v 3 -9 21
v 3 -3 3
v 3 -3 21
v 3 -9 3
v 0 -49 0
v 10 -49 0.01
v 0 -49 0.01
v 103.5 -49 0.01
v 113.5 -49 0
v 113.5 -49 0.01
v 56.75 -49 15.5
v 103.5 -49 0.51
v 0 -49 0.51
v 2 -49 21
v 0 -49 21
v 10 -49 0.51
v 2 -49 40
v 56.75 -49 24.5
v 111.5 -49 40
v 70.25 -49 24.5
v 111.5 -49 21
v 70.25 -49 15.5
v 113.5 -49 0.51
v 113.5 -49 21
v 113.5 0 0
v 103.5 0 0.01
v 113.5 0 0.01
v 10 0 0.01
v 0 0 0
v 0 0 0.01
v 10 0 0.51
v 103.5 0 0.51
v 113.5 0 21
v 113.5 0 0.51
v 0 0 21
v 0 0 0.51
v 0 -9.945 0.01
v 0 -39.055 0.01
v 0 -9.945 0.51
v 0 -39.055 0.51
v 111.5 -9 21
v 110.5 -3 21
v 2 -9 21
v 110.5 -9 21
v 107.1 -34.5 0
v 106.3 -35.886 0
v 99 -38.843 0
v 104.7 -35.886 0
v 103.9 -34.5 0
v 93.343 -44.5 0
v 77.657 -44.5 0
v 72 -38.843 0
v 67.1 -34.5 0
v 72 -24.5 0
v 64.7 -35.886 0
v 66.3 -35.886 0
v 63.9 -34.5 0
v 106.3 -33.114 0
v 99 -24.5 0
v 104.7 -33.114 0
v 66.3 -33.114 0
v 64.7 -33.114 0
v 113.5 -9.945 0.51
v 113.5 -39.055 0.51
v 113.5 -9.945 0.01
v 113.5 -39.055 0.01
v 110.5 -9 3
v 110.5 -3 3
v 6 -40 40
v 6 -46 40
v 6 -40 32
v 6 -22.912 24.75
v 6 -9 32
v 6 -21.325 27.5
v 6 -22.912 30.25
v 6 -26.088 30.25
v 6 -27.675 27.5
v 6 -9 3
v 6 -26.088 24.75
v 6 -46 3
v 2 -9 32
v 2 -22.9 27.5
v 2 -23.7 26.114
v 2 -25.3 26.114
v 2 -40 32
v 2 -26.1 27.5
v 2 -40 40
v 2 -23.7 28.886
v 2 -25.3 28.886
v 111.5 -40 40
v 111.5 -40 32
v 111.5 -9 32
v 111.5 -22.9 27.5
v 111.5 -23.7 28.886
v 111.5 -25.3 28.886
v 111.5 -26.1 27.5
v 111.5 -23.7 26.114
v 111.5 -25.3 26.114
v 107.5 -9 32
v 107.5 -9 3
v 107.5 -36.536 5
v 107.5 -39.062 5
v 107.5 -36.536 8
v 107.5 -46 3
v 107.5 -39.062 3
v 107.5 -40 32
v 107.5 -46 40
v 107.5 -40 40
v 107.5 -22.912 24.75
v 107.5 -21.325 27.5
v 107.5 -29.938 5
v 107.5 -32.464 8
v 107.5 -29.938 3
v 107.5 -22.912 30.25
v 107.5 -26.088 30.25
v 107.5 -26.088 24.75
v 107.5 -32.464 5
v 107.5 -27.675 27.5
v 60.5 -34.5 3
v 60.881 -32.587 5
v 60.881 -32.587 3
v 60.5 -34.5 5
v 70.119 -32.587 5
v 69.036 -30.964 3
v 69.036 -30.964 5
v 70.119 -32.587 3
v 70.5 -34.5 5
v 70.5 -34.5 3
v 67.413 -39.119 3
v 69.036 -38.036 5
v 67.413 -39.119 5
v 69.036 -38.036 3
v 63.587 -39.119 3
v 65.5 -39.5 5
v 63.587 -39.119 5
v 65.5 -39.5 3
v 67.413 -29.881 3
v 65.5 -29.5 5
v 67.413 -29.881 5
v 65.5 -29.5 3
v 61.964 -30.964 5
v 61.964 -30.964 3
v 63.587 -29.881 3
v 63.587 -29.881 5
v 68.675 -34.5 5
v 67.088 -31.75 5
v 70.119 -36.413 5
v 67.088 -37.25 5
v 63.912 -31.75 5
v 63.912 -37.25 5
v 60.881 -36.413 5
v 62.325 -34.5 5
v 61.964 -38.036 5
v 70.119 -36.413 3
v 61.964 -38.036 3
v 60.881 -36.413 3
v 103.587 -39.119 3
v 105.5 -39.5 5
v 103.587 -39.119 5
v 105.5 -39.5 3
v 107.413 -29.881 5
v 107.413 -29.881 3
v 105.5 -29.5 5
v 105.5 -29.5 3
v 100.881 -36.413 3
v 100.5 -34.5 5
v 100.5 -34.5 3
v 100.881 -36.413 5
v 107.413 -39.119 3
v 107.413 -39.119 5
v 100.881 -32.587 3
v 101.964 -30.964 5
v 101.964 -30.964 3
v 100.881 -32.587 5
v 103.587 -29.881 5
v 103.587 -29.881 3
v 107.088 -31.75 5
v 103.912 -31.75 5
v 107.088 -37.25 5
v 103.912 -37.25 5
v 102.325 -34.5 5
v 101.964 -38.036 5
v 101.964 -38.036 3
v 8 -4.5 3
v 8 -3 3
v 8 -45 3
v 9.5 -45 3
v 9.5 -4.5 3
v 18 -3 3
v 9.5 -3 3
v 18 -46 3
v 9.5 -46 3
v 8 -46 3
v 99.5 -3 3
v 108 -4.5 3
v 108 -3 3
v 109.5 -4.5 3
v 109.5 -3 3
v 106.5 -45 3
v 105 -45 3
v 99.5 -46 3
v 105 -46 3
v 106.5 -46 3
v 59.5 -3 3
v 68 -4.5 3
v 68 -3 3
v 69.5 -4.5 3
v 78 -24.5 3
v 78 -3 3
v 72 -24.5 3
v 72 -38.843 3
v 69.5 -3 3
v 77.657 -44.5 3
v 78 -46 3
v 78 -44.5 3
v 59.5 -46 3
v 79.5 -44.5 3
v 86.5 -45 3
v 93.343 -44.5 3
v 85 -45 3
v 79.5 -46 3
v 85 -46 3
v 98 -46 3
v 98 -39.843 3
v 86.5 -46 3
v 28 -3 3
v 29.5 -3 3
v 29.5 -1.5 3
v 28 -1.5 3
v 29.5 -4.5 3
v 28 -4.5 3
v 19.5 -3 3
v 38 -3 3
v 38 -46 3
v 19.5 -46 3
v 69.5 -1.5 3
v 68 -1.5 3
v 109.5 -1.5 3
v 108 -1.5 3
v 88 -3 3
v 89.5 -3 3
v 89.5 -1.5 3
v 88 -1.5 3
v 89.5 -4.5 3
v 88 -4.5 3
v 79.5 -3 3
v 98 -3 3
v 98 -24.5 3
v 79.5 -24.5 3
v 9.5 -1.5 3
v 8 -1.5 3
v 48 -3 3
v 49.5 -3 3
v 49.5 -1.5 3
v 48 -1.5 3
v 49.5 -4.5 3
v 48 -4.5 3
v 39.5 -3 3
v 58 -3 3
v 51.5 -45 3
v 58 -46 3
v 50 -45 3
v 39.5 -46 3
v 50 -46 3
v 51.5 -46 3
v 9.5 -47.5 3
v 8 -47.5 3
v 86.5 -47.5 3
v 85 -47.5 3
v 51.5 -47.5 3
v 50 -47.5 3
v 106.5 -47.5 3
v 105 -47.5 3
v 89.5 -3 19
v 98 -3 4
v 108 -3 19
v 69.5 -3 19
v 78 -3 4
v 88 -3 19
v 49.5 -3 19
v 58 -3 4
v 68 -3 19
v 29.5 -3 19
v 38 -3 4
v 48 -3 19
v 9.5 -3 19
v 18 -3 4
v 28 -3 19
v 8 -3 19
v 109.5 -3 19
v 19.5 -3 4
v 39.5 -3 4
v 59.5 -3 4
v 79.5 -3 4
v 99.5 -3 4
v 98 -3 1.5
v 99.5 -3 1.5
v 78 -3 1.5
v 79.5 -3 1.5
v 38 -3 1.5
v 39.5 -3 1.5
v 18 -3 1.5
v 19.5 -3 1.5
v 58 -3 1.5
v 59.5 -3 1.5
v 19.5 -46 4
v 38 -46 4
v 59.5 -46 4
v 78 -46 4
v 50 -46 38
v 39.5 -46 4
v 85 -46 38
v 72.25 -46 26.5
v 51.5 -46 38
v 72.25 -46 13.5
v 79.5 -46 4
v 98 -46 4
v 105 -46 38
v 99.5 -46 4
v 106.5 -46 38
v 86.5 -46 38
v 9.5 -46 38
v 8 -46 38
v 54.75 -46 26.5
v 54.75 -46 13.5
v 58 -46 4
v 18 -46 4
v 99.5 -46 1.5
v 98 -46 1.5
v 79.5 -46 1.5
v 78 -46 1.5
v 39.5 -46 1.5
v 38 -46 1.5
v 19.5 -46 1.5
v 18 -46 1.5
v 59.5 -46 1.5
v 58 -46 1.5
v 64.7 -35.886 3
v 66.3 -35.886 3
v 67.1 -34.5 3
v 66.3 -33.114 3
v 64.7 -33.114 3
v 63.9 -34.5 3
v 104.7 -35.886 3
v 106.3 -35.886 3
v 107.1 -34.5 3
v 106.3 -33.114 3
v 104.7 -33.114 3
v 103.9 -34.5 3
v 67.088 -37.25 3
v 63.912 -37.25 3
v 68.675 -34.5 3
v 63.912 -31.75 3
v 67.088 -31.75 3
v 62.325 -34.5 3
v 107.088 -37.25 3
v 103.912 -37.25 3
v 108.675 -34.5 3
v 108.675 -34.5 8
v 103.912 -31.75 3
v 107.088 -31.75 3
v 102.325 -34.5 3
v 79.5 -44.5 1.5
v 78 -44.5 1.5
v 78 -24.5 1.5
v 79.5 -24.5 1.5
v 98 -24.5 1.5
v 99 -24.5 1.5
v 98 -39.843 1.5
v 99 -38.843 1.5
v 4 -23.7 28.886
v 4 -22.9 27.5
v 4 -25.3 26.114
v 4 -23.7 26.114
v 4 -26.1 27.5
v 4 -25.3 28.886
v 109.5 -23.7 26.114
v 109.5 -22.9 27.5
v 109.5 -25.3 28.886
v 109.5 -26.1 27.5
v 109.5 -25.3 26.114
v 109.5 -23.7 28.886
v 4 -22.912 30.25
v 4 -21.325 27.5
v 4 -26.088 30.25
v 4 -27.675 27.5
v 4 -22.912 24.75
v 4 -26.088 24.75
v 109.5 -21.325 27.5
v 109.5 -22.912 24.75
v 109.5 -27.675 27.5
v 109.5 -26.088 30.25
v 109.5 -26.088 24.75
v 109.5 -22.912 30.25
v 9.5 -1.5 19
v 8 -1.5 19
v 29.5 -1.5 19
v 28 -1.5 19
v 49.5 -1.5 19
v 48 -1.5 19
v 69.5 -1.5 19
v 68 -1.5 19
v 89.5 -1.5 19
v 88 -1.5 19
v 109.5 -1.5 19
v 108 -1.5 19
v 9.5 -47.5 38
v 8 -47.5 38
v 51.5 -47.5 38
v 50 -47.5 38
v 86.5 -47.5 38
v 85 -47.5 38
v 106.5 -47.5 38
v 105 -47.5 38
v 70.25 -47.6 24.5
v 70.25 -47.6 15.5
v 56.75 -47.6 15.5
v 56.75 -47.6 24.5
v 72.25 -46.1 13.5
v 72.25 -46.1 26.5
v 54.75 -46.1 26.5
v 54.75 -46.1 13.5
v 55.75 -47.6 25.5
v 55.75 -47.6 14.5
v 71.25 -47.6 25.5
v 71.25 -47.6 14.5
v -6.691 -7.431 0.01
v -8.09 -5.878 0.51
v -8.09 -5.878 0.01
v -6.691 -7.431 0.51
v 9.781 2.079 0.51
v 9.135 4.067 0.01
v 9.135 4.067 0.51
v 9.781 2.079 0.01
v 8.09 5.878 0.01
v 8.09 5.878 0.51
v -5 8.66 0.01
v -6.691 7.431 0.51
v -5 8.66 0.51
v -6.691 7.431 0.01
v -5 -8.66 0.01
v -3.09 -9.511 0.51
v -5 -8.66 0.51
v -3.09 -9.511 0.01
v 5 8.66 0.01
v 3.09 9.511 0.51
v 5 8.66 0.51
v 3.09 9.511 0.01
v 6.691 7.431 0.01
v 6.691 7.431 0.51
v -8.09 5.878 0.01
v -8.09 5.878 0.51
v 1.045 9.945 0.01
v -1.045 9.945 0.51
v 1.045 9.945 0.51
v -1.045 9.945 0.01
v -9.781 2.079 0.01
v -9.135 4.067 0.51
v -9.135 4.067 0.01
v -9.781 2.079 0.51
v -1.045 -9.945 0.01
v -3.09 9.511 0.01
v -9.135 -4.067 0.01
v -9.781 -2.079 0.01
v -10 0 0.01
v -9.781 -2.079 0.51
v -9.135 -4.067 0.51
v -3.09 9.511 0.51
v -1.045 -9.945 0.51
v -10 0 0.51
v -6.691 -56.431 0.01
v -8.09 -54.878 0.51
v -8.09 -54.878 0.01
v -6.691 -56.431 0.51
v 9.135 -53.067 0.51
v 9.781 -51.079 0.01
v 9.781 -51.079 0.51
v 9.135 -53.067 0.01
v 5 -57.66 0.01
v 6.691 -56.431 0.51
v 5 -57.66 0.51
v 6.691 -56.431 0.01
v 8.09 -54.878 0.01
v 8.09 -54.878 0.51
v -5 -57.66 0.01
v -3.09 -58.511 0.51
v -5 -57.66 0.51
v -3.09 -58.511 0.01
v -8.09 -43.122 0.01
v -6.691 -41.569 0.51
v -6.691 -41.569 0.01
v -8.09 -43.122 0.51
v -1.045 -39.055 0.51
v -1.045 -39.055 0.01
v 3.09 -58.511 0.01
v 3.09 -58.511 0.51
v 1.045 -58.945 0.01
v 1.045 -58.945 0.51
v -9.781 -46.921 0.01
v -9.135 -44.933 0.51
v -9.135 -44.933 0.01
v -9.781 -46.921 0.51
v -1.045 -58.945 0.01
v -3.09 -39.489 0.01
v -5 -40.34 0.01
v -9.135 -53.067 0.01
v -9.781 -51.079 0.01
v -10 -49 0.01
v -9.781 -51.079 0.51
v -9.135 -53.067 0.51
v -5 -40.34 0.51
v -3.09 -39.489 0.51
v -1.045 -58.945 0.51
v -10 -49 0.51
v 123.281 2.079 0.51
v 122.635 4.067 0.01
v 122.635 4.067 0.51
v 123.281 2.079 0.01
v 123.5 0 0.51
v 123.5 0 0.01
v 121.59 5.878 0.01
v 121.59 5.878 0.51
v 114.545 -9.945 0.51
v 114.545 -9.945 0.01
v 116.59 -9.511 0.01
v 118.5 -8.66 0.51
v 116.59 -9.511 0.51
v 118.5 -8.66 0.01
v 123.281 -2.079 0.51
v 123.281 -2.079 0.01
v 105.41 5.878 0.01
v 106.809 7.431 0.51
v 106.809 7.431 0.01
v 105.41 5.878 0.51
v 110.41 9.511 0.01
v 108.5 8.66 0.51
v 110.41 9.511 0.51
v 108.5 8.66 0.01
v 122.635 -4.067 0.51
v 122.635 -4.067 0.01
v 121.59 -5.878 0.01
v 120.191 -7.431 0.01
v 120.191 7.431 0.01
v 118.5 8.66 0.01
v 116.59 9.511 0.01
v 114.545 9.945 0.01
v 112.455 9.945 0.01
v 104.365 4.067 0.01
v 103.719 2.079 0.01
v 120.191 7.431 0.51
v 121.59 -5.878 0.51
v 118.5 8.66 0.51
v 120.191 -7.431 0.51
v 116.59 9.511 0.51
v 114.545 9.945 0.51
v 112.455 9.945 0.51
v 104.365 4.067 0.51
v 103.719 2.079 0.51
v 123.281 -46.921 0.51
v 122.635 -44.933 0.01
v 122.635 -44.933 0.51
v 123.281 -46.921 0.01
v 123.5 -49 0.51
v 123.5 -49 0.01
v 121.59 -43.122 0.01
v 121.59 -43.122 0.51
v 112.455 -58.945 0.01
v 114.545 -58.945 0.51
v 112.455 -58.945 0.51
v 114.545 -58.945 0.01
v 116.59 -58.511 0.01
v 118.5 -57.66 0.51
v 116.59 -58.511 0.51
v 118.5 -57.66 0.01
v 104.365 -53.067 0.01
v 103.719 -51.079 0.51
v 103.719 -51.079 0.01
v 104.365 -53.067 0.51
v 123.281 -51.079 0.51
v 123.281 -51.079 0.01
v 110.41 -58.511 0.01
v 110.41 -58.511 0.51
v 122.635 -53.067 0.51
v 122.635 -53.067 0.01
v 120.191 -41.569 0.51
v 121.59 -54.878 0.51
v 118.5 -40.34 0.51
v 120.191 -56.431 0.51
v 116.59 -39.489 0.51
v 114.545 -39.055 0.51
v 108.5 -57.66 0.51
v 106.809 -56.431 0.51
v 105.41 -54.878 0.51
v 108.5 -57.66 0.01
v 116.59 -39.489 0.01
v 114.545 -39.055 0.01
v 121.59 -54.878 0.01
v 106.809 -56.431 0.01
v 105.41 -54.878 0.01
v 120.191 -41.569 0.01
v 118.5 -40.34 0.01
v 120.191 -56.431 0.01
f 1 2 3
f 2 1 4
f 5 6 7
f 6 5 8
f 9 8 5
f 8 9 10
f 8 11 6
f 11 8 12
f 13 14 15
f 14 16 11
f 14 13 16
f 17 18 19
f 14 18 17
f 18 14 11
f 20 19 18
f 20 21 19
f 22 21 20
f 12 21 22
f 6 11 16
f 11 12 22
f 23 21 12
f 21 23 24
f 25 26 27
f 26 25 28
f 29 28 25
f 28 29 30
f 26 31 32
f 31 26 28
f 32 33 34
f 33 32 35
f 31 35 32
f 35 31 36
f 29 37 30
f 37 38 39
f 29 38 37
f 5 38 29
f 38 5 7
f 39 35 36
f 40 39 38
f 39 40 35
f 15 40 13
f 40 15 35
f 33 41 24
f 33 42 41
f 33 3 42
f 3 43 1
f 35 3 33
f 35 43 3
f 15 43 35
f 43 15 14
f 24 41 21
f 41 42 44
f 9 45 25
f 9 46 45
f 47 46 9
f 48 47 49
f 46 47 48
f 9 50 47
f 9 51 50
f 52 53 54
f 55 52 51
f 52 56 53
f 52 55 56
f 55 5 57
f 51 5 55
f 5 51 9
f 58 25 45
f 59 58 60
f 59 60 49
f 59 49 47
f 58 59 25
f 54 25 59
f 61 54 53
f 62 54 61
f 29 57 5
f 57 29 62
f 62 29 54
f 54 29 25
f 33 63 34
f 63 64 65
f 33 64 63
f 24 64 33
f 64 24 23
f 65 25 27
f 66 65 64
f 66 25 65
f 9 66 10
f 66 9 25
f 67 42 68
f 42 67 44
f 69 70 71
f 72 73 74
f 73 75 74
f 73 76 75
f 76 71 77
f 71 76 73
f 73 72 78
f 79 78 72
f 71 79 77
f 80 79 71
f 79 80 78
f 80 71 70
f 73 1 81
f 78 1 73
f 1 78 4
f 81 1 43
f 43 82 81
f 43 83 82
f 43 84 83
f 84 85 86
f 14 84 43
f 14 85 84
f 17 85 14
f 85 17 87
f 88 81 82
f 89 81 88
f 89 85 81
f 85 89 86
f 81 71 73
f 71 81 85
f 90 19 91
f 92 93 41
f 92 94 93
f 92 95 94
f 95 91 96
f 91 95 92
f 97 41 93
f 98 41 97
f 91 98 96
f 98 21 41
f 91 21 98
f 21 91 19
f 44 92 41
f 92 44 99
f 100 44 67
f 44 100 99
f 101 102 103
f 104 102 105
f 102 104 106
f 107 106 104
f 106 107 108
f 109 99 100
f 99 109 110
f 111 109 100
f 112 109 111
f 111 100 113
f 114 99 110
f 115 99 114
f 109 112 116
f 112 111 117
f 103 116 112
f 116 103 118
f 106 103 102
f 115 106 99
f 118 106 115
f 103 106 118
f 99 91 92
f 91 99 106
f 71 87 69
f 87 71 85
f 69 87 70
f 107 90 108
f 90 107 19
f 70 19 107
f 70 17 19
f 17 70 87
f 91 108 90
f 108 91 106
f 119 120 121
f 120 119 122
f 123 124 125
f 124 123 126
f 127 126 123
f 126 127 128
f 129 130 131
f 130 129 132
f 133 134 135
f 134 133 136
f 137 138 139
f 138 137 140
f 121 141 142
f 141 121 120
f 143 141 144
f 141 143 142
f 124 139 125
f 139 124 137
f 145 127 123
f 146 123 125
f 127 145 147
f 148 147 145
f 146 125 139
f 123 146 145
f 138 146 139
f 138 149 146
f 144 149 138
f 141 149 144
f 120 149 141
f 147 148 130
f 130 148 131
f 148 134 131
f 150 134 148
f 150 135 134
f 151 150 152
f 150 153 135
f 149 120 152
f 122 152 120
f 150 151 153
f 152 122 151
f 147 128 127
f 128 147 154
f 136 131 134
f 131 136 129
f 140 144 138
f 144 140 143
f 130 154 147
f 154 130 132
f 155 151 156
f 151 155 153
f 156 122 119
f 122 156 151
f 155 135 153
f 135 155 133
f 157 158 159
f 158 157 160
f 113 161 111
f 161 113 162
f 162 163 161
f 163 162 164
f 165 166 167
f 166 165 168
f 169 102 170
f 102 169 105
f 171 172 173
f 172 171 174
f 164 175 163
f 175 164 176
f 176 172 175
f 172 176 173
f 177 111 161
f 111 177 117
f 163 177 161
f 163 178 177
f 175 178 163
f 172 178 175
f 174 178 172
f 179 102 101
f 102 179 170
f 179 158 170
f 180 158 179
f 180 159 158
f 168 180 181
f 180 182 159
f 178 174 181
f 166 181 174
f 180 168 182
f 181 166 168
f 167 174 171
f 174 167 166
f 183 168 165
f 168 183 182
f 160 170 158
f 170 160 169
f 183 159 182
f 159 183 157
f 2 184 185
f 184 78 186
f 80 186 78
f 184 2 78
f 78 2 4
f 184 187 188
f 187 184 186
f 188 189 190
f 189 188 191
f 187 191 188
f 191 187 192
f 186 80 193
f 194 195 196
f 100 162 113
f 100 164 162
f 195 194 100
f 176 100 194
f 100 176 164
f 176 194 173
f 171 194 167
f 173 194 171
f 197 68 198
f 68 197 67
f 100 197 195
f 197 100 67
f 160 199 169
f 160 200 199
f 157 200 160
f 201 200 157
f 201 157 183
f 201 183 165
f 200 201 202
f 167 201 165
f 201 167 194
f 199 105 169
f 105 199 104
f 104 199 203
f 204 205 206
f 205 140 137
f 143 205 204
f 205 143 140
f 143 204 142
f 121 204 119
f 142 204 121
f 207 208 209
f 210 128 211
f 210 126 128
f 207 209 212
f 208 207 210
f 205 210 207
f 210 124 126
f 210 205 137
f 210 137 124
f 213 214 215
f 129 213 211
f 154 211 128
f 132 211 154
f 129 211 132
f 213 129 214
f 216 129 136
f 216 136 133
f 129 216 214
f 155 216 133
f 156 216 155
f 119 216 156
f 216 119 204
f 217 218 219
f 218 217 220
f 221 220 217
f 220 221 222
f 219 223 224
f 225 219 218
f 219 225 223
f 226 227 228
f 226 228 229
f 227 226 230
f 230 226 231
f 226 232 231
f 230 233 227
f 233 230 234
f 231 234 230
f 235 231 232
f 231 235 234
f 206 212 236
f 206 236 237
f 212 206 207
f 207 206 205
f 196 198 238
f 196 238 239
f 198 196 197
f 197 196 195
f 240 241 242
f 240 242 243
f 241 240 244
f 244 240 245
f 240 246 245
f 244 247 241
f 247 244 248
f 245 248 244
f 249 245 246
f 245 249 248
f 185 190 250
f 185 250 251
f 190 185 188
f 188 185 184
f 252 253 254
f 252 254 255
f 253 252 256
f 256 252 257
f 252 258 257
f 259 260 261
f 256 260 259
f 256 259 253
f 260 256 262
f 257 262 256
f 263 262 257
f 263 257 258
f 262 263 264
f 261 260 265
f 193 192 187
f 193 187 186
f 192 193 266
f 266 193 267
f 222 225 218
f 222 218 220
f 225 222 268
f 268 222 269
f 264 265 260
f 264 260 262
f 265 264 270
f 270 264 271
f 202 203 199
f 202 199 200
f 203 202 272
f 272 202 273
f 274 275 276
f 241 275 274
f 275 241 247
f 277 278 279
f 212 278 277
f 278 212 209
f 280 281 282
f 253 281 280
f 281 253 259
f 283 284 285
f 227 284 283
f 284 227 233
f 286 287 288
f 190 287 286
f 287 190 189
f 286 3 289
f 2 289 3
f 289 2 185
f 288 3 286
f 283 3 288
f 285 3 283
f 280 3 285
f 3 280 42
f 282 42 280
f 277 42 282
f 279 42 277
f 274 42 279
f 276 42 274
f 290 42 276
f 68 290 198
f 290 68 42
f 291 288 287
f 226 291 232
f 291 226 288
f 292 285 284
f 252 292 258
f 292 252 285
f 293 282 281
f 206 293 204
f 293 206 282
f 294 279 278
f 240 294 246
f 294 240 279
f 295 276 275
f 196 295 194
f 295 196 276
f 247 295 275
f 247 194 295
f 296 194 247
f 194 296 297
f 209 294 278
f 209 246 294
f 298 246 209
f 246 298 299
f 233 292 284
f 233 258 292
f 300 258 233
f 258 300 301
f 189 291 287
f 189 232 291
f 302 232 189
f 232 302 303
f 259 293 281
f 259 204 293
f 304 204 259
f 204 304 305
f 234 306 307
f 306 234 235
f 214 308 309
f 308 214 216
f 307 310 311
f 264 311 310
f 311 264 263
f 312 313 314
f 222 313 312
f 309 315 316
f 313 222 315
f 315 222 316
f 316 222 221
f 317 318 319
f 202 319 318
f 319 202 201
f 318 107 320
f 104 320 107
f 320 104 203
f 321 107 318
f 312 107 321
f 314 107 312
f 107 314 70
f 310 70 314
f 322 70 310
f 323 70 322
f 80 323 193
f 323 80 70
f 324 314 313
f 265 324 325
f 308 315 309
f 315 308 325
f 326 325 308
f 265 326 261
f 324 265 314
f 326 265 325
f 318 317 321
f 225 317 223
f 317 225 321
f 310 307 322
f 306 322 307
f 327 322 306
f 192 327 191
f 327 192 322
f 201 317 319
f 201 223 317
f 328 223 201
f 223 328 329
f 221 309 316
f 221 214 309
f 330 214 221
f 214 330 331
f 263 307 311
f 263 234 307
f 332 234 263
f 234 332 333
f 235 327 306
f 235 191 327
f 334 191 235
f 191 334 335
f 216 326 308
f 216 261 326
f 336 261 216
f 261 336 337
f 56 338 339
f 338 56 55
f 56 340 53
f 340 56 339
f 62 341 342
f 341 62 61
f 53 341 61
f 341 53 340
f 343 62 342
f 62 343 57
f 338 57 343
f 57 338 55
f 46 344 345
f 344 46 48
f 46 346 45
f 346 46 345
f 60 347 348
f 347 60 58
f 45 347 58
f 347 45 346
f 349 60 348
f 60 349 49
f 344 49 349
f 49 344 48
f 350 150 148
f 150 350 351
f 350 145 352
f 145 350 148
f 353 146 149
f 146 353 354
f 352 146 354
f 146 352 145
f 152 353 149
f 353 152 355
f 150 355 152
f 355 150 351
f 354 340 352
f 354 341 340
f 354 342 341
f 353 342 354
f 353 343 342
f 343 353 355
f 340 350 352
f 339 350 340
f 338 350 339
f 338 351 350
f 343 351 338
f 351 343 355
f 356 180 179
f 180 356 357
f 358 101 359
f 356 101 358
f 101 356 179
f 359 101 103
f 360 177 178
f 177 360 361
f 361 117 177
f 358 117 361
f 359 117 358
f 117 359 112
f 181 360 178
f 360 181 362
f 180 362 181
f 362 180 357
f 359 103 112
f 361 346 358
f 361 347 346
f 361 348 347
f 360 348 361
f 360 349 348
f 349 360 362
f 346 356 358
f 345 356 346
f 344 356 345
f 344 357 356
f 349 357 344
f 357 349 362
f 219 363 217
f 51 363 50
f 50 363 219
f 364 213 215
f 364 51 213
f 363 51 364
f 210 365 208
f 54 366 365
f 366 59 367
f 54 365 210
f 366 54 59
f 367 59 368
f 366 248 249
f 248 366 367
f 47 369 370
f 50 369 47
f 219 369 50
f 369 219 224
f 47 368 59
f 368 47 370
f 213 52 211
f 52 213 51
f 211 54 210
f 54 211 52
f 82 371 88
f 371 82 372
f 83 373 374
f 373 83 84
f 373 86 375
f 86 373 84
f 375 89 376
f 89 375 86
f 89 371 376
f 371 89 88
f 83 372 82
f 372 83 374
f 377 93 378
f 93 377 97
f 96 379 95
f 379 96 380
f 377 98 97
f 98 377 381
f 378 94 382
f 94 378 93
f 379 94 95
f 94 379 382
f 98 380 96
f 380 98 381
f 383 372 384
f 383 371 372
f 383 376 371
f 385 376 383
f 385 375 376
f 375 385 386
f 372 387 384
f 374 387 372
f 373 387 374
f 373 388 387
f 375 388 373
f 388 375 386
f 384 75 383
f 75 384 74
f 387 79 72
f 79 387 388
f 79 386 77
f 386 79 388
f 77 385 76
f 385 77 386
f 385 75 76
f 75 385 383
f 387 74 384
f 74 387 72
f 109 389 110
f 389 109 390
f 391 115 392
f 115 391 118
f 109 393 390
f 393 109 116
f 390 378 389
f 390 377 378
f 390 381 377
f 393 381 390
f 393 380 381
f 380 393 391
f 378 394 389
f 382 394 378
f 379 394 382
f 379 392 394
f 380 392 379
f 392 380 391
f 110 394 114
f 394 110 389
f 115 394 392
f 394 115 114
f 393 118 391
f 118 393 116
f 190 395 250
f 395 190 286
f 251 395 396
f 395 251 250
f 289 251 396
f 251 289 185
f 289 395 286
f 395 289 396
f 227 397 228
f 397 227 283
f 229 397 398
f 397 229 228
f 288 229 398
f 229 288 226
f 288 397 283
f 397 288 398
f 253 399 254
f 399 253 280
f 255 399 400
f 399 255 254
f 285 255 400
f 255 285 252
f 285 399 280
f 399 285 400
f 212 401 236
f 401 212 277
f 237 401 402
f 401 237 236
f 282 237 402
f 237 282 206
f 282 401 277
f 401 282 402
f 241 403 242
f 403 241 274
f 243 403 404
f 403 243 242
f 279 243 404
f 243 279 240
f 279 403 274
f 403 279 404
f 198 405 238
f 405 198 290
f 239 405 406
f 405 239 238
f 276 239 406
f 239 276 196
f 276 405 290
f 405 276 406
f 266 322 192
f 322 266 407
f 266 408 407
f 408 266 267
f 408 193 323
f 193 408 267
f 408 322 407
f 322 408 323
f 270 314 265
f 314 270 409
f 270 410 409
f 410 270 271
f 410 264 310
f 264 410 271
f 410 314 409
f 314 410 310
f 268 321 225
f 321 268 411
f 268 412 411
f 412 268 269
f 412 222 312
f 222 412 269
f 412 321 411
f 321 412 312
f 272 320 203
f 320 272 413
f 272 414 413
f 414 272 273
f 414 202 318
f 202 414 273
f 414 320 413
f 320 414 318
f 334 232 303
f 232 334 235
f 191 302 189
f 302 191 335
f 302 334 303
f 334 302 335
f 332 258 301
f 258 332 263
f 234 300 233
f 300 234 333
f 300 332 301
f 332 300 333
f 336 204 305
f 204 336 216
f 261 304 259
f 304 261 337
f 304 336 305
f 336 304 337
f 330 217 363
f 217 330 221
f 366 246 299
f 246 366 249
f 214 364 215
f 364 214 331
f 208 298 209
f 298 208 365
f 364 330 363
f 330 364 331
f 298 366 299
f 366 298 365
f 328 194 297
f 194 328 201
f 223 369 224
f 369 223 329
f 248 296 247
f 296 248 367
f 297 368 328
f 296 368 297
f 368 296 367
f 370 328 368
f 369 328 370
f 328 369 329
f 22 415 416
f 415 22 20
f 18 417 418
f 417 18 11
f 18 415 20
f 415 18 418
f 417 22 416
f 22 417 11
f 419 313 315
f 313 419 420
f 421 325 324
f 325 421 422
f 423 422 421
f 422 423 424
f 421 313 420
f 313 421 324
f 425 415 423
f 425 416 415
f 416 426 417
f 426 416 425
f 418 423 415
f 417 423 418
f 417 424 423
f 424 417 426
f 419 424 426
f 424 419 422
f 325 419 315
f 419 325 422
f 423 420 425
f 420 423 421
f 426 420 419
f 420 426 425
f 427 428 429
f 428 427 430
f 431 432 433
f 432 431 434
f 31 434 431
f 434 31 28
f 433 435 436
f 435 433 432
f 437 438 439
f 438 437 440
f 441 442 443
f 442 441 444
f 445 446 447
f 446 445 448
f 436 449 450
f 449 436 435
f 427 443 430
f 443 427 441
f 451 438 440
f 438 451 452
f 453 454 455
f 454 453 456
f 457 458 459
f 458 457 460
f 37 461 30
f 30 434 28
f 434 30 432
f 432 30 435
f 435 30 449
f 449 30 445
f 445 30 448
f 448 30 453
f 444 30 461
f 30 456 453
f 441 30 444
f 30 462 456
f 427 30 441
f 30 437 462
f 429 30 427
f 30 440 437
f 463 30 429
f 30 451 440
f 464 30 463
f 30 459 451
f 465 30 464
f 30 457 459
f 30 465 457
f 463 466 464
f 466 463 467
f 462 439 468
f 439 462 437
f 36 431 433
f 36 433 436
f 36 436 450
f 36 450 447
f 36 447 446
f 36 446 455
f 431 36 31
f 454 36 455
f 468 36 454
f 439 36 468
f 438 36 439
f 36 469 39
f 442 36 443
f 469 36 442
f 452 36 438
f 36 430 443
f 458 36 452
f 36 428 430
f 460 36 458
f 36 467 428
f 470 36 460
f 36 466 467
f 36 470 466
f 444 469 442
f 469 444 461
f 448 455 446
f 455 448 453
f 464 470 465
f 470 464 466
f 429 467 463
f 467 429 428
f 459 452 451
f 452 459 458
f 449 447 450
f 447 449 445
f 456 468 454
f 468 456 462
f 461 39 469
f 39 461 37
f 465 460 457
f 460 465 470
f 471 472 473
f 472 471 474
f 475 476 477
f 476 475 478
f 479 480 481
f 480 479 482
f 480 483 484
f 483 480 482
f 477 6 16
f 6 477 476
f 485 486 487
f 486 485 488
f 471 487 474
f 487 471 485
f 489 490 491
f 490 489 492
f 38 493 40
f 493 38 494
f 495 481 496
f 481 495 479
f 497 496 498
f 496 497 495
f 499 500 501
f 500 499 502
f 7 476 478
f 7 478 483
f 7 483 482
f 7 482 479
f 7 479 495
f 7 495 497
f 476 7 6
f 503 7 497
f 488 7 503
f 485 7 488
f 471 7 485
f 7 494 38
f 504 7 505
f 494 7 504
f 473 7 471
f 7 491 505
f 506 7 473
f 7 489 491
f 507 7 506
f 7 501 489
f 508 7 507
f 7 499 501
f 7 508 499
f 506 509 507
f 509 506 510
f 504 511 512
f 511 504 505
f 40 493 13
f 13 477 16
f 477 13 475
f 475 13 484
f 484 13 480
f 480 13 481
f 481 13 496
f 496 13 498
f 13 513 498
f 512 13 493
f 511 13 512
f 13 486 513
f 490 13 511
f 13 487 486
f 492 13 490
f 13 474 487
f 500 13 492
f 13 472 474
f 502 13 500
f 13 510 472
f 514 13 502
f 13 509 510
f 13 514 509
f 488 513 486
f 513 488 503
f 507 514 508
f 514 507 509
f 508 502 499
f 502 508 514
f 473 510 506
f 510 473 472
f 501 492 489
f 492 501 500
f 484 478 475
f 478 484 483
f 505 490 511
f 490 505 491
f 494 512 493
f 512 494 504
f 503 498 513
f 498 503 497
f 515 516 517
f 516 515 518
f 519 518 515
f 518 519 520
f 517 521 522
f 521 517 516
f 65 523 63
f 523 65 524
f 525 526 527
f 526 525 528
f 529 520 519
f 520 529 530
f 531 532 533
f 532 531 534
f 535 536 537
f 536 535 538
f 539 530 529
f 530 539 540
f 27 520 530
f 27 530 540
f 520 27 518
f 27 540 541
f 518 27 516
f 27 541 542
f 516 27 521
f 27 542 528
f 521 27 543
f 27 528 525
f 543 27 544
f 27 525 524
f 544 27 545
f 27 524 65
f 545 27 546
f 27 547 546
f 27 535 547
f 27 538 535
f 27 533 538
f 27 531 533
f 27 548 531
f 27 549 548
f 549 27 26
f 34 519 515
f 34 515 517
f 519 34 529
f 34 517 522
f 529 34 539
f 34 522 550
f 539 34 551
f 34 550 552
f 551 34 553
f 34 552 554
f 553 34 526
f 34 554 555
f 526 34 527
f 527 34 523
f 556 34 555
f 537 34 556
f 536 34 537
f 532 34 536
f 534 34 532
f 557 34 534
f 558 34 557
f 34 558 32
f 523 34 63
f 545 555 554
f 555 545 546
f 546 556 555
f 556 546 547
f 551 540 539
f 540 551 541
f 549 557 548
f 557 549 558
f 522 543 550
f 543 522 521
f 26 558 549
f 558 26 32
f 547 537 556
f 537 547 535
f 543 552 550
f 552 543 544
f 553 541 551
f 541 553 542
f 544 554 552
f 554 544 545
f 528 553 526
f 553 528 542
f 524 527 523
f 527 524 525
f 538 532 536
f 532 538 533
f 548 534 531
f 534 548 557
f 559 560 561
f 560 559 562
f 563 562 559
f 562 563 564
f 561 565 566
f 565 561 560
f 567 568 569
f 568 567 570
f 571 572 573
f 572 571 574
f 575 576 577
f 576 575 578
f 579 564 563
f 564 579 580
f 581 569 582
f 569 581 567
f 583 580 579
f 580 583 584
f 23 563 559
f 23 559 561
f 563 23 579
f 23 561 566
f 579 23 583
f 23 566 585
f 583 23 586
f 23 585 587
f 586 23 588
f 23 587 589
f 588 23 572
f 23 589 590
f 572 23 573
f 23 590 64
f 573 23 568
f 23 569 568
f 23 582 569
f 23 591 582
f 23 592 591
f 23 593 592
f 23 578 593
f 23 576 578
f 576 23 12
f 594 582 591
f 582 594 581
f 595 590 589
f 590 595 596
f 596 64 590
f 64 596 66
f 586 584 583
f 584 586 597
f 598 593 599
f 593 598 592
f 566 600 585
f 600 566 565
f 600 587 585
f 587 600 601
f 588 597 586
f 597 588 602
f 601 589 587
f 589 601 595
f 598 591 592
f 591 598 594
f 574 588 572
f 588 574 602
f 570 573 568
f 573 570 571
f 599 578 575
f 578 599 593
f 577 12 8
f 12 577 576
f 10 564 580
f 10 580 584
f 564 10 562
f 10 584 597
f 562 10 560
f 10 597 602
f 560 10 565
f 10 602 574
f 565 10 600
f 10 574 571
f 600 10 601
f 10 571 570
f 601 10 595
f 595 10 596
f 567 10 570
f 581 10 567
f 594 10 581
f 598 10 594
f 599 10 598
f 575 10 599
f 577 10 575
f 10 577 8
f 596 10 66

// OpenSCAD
//////////////////////////////////////////////////////////////////////////////////////
///
///  Yet another power supply cover!
///
///  It's for the inexpesive 360W 12V/30A powersupply offered on eBay for under $30.
///  It is designed for the following additional components:
///  - 1pc standard IEC320 C14 AC inlet power socket
///  - 1pc mini on-off rocker switch 3A 250V 15mmx11mm (KCD1)
///  - 1-3 pcs large Molex 2-pin power connectors
///
//////////////////////////////////////////////////////////////////////////////////////
///
///  2013-10-27 Heinz Spiess, Switzerland
///
///  released under Creative Commons - Attribution - Share Alike licence
//////////////////////////////////////////////////////////////////////////////////////

// power supply dimensions
psw = 113.5;// width fo power supply
psh = 49; // height of power supply
psd = 19; // depth inside power supply
psa = 2.0;// thickness of alu sheets
psb = 9;  // thickness of ps bottom

// molex female plug dimensions
mow = 15; // width of molex socket
moh = 8.5; // height of molex socket
moc = 1.5;   // extra height of clip
mod = 18;  // depth of molex in case
mox = 0;  // position of molex sockets
mon = 3;   // number of molex slots

// ac socket dimensions
act = 50;  // total width of ac socket
acw = 27;  // width of ac socket
ach = 20;  // height of ac socket
acs = 40;  // screw distance of ac socket
acc = 8;   // corner length

// ac switch
sww = 13.5;  // switch width
swh = 9;   // switch height

// lcd voltage display
vdw = 23; // width
vdh = 14.5; // height
vdd = 6;  // depth
vds = 28; // screw base

//
exd = 21; // extruding depth behind power supply
wall = 3; // wall thickness
m4 = 4.2;  // screw diameter
m3 = 3.2;  // screw diameter

module pscover(supports=true){
  difference(){
    union(){
      // man cover walls
      cube([psw,wall,psh]);
      cube([psw,exd,wall]);     
      translate([psa,0,psh-wall])cube([psw-2*psa,psd+exd,wall]);     

      // side walls
      for(x=[0,psw-wall])translate([x,0,0])cube([wall,exd,psh]);
      for(x=[psa,psw-wall-psa-1])translate([x,0,psb])cube([wall+1,exd+11.0,psh-psb]);
      for(x=[psa,psw-wall-psa-1])translate([x,0,psh-psb])cube([wall+1,exd+psd,psb]);

      // ac socket screw hubs
      translate([psw-wall-act/2,0,psh-1.5*wall-ach/2])
      for(x=[-acs/2,acs/2])translate([x,0,0])rotate(-90,[1,0,0])cylinder(r=5, wall+2);

     
    }
   
      // ac socket cutout
      translate([psw-wall-act/2,0,psh-1.5*wall-ach/2]){
         for(x=[-acs/2,acs/2])translate([x,-1,0])rotate(-90,[1,0,0])cylinder(r=m3/2, wall+2);
         for(x=[-acs/2,acs/2])translate([x,wall,0])rotate(-90,[1,0,0])cylinder(r=5.5/2/cos(30), wall+2,$fn=6);
	 hull(){
	   translate([-acw/2,-1,-ach/2])cube([acw,wall+2,ach-acc/sqrt(2)]);
	   translate([-acw/2+acc/sqrt(2),-1,+ach/2-0.1])cube([acw-sqrt(2)*acc,wall+2,0.1]);
	 }
      }

     
      // ac switch cutout
      translate([psw/2,(exd+psd)/2-swh/2,psh-wall-1])cube([sww,swh,wall+2]);
      hull(){
          translate([psw/2-2,(exd+psd)/2-swh/2-2,psh-wall-0.1])cube([sww+4,swh+4,0.2]);
          translate([psw/2-1,(exd+psd)/2-swh/2-1,psh-wall/2])cube([sww+2,swh+2,0.1]);
      }

      // cutout for screws
      translate([psw/2,exd+6.5,psh/2])for(s=[-1,1])scale([s,1,1])translate([psw/2-wall-psa-1,0,0])rotate(90,[0,1,0])cylinder(r=m3/2,h=wall+psa+2);
      translate([psw/2,exd+6.5,psh/2])for(s=[-1,1])scale([s,1,1])translate([psw/2-wall-psa-2,0,0])rotate(90,[0,1,0])cylinder(r=5.5/2/cos(30),h=psa+1,$fn=6);

      //  anti-warping grooves
      for(x = [8:20:psw-5]) translate([x,wall,wall/2])cube([1.5,exd-wall-2,wall]);
      for(x = [8,50,85,105]) translate([x,wall,psh-wall-1])cube([1.5,exd+psd-wall-2,wall/2+1]);
      for(x = [18:20:psw-5]) translate([x,wall/2,wall])cube([1.5,wall/2+1,psh-2*wall]);
  }

  
  // anti-warping disks

  if(supports)color("red")for(x=[0,psw])for(z=[0,psh])translate([x,0.01,z])rotate(-90,[1,0,0])cylinder(r=10,h=0.5);
}

//pscover(supports=false);
//translate([-100,0,0])rotate(90)pscover(supports=false);
//translate([90,140,30])rotate(180)pscover(supports=false);

//translate([0,-50,0])color("blue")rotate(90,[1,0,0]) pscover();
rotate(90,[1,0,0]) pscover(supports=true);
